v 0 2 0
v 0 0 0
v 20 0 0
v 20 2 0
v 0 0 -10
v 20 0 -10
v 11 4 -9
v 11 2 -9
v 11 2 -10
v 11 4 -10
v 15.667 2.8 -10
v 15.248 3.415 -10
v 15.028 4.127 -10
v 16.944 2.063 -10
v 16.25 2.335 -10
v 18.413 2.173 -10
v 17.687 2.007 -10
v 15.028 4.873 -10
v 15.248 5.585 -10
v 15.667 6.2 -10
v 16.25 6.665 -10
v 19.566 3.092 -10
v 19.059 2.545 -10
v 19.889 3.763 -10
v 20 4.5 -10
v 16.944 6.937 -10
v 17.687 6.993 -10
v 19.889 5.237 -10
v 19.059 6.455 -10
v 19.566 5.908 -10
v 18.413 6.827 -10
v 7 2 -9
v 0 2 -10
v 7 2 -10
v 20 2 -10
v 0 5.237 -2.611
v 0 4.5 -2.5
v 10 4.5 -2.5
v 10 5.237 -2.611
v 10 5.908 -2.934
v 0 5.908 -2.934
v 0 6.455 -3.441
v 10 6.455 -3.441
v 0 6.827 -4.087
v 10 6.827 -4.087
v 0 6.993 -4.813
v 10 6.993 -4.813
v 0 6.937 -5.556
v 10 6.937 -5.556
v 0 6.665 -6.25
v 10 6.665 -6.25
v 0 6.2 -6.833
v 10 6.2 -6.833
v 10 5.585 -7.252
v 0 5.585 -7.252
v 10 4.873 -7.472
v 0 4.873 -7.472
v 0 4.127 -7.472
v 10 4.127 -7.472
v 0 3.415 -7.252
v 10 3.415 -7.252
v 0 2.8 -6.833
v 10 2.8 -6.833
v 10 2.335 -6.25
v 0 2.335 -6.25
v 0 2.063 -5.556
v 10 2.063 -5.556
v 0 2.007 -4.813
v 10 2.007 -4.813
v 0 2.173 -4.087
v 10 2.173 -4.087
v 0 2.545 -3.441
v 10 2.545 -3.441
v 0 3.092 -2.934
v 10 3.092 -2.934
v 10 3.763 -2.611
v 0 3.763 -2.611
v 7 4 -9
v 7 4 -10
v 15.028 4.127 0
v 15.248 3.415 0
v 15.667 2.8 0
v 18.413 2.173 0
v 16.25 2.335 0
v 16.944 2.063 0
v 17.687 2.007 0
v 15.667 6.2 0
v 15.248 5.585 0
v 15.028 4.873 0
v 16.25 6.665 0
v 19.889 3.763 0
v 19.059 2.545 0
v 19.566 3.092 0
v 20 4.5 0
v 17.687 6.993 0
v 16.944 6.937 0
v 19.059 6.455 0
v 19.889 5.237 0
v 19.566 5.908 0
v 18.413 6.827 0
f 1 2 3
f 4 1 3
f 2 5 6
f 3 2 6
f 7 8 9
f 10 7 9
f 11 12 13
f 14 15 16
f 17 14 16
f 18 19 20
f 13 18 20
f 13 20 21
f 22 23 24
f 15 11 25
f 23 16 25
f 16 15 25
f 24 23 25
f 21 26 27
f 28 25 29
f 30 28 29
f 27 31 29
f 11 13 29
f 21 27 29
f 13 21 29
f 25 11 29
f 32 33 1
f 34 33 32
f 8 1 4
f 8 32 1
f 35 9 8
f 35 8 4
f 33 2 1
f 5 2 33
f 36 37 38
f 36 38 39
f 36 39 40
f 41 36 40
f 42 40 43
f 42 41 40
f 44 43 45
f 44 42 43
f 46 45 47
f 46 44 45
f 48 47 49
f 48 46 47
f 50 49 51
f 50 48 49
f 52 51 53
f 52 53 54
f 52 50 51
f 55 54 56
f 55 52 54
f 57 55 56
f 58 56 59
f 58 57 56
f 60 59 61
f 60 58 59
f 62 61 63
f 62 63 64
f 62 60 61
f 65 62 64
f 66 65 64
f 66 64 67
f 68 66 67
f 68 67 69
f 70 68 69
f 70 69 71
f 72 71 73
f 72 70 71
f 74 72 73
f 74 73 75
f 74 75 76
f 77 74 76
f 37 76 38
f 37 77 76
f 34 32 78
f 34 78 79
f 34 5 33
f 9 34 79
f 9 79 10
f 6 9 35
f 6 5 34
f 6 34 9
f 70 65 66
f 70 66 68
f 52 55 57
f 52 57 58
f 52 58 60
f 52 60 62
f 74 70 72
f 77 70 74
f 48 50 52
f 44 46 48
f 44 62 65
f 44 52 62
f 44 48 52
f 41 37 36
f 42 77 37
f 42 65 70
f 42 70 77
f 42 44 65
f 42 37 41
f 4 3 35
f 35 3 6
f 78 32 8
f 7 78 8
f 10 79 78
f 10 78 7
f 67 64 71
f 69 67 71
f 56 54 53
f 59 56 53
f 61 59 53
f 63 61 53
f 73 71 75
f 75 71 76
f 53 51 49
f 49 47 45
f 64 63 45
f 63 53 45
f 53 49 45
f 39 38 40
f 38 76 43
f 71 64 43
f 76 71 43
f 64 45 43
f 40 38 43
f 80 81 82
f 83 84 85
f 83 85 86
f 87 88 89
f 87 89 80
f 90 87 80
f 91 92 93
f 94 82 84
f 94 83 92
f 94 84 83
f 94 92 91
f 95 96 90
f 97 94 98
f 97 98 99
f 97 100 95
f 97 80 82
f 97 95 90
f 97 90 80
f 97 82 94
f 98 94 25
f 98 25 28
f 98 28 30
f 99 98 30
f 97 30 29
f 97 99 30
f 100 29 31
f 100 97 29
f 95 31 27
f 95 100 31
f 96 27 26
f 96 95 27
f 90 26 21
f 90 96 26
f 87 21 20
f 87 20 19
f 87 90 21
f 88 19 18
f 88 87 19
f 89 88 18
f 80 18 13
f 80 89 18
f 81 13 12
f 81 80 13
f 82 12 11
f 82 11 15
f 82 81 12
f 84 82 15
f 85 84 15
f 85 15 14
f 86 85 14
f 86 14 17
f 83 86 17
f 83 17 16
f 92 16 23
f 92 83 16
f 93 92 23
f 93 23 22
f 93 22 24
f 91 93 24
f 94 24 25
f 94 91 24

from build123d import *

# Parameters (mm, degrees)
SKETCH_1_W      = 20
SKETCH_1_H      = 10
EXTRUDE_1_DEPTH = 2
SKETCH_2_R      = 2.5
EXTRUDE_2_DEPTH = 10
SKETCH_3_R      = 2.5
EXTRUDE_3_DEPTH = 10
SKETCH_4_W      = 4
SKETCH_4_H      = 1
EXTRUDE_4_DEPTH = 2


with BuildPart() as part:
    # 草图1 → 凸台-拉伸1 (new body)
    with BuildSketch(Plane(origin=(0, 0, 0), x_dir=(1, 0, 0), z_dir=(0, 1, 0))):
        with Locations((10, 5)):
            Rectangle(SKETCH_1_W, SKETCH_1_H)
    extrude(amount=EXTRUDE_1_DEPTH)

    # 草图4 → 凸台-拉伸4 (add)
    with BuildSketch(Plane(origin=(0, 2, 0), x_dir=(1, 0, 0), z_dir=(0, 1, 0))):
        with Locations((9, 9.5)):
            Rectangle(SKETCH_4_W, SKETCH_4_H)
    extrude(amount=EXTRUDE_4_DEPTH)


with BuildPart() as body_2:
    # 草图2 → 凸台-拉伸2 (new body)
    with BuildSketch(Plane.XY):
        with Locations((17.5, 4.5)):
            Circle(SKETCH_2_R)
    extrude(amount=-EXTRUDE_2_DEPTH)


with BuildPart() as body_3:
    # 草图3 → 凸台-拉伸3 (new body)
    with BuildSketch(Plane.ZY):
        with Locations((-5, 4.5)):
            Circle(SKETCH_3_R)
    extrude(amount=-EXTRUDE_3_DEPTH)


solid = Compound([part.part, body_2.part, body_3.part])
